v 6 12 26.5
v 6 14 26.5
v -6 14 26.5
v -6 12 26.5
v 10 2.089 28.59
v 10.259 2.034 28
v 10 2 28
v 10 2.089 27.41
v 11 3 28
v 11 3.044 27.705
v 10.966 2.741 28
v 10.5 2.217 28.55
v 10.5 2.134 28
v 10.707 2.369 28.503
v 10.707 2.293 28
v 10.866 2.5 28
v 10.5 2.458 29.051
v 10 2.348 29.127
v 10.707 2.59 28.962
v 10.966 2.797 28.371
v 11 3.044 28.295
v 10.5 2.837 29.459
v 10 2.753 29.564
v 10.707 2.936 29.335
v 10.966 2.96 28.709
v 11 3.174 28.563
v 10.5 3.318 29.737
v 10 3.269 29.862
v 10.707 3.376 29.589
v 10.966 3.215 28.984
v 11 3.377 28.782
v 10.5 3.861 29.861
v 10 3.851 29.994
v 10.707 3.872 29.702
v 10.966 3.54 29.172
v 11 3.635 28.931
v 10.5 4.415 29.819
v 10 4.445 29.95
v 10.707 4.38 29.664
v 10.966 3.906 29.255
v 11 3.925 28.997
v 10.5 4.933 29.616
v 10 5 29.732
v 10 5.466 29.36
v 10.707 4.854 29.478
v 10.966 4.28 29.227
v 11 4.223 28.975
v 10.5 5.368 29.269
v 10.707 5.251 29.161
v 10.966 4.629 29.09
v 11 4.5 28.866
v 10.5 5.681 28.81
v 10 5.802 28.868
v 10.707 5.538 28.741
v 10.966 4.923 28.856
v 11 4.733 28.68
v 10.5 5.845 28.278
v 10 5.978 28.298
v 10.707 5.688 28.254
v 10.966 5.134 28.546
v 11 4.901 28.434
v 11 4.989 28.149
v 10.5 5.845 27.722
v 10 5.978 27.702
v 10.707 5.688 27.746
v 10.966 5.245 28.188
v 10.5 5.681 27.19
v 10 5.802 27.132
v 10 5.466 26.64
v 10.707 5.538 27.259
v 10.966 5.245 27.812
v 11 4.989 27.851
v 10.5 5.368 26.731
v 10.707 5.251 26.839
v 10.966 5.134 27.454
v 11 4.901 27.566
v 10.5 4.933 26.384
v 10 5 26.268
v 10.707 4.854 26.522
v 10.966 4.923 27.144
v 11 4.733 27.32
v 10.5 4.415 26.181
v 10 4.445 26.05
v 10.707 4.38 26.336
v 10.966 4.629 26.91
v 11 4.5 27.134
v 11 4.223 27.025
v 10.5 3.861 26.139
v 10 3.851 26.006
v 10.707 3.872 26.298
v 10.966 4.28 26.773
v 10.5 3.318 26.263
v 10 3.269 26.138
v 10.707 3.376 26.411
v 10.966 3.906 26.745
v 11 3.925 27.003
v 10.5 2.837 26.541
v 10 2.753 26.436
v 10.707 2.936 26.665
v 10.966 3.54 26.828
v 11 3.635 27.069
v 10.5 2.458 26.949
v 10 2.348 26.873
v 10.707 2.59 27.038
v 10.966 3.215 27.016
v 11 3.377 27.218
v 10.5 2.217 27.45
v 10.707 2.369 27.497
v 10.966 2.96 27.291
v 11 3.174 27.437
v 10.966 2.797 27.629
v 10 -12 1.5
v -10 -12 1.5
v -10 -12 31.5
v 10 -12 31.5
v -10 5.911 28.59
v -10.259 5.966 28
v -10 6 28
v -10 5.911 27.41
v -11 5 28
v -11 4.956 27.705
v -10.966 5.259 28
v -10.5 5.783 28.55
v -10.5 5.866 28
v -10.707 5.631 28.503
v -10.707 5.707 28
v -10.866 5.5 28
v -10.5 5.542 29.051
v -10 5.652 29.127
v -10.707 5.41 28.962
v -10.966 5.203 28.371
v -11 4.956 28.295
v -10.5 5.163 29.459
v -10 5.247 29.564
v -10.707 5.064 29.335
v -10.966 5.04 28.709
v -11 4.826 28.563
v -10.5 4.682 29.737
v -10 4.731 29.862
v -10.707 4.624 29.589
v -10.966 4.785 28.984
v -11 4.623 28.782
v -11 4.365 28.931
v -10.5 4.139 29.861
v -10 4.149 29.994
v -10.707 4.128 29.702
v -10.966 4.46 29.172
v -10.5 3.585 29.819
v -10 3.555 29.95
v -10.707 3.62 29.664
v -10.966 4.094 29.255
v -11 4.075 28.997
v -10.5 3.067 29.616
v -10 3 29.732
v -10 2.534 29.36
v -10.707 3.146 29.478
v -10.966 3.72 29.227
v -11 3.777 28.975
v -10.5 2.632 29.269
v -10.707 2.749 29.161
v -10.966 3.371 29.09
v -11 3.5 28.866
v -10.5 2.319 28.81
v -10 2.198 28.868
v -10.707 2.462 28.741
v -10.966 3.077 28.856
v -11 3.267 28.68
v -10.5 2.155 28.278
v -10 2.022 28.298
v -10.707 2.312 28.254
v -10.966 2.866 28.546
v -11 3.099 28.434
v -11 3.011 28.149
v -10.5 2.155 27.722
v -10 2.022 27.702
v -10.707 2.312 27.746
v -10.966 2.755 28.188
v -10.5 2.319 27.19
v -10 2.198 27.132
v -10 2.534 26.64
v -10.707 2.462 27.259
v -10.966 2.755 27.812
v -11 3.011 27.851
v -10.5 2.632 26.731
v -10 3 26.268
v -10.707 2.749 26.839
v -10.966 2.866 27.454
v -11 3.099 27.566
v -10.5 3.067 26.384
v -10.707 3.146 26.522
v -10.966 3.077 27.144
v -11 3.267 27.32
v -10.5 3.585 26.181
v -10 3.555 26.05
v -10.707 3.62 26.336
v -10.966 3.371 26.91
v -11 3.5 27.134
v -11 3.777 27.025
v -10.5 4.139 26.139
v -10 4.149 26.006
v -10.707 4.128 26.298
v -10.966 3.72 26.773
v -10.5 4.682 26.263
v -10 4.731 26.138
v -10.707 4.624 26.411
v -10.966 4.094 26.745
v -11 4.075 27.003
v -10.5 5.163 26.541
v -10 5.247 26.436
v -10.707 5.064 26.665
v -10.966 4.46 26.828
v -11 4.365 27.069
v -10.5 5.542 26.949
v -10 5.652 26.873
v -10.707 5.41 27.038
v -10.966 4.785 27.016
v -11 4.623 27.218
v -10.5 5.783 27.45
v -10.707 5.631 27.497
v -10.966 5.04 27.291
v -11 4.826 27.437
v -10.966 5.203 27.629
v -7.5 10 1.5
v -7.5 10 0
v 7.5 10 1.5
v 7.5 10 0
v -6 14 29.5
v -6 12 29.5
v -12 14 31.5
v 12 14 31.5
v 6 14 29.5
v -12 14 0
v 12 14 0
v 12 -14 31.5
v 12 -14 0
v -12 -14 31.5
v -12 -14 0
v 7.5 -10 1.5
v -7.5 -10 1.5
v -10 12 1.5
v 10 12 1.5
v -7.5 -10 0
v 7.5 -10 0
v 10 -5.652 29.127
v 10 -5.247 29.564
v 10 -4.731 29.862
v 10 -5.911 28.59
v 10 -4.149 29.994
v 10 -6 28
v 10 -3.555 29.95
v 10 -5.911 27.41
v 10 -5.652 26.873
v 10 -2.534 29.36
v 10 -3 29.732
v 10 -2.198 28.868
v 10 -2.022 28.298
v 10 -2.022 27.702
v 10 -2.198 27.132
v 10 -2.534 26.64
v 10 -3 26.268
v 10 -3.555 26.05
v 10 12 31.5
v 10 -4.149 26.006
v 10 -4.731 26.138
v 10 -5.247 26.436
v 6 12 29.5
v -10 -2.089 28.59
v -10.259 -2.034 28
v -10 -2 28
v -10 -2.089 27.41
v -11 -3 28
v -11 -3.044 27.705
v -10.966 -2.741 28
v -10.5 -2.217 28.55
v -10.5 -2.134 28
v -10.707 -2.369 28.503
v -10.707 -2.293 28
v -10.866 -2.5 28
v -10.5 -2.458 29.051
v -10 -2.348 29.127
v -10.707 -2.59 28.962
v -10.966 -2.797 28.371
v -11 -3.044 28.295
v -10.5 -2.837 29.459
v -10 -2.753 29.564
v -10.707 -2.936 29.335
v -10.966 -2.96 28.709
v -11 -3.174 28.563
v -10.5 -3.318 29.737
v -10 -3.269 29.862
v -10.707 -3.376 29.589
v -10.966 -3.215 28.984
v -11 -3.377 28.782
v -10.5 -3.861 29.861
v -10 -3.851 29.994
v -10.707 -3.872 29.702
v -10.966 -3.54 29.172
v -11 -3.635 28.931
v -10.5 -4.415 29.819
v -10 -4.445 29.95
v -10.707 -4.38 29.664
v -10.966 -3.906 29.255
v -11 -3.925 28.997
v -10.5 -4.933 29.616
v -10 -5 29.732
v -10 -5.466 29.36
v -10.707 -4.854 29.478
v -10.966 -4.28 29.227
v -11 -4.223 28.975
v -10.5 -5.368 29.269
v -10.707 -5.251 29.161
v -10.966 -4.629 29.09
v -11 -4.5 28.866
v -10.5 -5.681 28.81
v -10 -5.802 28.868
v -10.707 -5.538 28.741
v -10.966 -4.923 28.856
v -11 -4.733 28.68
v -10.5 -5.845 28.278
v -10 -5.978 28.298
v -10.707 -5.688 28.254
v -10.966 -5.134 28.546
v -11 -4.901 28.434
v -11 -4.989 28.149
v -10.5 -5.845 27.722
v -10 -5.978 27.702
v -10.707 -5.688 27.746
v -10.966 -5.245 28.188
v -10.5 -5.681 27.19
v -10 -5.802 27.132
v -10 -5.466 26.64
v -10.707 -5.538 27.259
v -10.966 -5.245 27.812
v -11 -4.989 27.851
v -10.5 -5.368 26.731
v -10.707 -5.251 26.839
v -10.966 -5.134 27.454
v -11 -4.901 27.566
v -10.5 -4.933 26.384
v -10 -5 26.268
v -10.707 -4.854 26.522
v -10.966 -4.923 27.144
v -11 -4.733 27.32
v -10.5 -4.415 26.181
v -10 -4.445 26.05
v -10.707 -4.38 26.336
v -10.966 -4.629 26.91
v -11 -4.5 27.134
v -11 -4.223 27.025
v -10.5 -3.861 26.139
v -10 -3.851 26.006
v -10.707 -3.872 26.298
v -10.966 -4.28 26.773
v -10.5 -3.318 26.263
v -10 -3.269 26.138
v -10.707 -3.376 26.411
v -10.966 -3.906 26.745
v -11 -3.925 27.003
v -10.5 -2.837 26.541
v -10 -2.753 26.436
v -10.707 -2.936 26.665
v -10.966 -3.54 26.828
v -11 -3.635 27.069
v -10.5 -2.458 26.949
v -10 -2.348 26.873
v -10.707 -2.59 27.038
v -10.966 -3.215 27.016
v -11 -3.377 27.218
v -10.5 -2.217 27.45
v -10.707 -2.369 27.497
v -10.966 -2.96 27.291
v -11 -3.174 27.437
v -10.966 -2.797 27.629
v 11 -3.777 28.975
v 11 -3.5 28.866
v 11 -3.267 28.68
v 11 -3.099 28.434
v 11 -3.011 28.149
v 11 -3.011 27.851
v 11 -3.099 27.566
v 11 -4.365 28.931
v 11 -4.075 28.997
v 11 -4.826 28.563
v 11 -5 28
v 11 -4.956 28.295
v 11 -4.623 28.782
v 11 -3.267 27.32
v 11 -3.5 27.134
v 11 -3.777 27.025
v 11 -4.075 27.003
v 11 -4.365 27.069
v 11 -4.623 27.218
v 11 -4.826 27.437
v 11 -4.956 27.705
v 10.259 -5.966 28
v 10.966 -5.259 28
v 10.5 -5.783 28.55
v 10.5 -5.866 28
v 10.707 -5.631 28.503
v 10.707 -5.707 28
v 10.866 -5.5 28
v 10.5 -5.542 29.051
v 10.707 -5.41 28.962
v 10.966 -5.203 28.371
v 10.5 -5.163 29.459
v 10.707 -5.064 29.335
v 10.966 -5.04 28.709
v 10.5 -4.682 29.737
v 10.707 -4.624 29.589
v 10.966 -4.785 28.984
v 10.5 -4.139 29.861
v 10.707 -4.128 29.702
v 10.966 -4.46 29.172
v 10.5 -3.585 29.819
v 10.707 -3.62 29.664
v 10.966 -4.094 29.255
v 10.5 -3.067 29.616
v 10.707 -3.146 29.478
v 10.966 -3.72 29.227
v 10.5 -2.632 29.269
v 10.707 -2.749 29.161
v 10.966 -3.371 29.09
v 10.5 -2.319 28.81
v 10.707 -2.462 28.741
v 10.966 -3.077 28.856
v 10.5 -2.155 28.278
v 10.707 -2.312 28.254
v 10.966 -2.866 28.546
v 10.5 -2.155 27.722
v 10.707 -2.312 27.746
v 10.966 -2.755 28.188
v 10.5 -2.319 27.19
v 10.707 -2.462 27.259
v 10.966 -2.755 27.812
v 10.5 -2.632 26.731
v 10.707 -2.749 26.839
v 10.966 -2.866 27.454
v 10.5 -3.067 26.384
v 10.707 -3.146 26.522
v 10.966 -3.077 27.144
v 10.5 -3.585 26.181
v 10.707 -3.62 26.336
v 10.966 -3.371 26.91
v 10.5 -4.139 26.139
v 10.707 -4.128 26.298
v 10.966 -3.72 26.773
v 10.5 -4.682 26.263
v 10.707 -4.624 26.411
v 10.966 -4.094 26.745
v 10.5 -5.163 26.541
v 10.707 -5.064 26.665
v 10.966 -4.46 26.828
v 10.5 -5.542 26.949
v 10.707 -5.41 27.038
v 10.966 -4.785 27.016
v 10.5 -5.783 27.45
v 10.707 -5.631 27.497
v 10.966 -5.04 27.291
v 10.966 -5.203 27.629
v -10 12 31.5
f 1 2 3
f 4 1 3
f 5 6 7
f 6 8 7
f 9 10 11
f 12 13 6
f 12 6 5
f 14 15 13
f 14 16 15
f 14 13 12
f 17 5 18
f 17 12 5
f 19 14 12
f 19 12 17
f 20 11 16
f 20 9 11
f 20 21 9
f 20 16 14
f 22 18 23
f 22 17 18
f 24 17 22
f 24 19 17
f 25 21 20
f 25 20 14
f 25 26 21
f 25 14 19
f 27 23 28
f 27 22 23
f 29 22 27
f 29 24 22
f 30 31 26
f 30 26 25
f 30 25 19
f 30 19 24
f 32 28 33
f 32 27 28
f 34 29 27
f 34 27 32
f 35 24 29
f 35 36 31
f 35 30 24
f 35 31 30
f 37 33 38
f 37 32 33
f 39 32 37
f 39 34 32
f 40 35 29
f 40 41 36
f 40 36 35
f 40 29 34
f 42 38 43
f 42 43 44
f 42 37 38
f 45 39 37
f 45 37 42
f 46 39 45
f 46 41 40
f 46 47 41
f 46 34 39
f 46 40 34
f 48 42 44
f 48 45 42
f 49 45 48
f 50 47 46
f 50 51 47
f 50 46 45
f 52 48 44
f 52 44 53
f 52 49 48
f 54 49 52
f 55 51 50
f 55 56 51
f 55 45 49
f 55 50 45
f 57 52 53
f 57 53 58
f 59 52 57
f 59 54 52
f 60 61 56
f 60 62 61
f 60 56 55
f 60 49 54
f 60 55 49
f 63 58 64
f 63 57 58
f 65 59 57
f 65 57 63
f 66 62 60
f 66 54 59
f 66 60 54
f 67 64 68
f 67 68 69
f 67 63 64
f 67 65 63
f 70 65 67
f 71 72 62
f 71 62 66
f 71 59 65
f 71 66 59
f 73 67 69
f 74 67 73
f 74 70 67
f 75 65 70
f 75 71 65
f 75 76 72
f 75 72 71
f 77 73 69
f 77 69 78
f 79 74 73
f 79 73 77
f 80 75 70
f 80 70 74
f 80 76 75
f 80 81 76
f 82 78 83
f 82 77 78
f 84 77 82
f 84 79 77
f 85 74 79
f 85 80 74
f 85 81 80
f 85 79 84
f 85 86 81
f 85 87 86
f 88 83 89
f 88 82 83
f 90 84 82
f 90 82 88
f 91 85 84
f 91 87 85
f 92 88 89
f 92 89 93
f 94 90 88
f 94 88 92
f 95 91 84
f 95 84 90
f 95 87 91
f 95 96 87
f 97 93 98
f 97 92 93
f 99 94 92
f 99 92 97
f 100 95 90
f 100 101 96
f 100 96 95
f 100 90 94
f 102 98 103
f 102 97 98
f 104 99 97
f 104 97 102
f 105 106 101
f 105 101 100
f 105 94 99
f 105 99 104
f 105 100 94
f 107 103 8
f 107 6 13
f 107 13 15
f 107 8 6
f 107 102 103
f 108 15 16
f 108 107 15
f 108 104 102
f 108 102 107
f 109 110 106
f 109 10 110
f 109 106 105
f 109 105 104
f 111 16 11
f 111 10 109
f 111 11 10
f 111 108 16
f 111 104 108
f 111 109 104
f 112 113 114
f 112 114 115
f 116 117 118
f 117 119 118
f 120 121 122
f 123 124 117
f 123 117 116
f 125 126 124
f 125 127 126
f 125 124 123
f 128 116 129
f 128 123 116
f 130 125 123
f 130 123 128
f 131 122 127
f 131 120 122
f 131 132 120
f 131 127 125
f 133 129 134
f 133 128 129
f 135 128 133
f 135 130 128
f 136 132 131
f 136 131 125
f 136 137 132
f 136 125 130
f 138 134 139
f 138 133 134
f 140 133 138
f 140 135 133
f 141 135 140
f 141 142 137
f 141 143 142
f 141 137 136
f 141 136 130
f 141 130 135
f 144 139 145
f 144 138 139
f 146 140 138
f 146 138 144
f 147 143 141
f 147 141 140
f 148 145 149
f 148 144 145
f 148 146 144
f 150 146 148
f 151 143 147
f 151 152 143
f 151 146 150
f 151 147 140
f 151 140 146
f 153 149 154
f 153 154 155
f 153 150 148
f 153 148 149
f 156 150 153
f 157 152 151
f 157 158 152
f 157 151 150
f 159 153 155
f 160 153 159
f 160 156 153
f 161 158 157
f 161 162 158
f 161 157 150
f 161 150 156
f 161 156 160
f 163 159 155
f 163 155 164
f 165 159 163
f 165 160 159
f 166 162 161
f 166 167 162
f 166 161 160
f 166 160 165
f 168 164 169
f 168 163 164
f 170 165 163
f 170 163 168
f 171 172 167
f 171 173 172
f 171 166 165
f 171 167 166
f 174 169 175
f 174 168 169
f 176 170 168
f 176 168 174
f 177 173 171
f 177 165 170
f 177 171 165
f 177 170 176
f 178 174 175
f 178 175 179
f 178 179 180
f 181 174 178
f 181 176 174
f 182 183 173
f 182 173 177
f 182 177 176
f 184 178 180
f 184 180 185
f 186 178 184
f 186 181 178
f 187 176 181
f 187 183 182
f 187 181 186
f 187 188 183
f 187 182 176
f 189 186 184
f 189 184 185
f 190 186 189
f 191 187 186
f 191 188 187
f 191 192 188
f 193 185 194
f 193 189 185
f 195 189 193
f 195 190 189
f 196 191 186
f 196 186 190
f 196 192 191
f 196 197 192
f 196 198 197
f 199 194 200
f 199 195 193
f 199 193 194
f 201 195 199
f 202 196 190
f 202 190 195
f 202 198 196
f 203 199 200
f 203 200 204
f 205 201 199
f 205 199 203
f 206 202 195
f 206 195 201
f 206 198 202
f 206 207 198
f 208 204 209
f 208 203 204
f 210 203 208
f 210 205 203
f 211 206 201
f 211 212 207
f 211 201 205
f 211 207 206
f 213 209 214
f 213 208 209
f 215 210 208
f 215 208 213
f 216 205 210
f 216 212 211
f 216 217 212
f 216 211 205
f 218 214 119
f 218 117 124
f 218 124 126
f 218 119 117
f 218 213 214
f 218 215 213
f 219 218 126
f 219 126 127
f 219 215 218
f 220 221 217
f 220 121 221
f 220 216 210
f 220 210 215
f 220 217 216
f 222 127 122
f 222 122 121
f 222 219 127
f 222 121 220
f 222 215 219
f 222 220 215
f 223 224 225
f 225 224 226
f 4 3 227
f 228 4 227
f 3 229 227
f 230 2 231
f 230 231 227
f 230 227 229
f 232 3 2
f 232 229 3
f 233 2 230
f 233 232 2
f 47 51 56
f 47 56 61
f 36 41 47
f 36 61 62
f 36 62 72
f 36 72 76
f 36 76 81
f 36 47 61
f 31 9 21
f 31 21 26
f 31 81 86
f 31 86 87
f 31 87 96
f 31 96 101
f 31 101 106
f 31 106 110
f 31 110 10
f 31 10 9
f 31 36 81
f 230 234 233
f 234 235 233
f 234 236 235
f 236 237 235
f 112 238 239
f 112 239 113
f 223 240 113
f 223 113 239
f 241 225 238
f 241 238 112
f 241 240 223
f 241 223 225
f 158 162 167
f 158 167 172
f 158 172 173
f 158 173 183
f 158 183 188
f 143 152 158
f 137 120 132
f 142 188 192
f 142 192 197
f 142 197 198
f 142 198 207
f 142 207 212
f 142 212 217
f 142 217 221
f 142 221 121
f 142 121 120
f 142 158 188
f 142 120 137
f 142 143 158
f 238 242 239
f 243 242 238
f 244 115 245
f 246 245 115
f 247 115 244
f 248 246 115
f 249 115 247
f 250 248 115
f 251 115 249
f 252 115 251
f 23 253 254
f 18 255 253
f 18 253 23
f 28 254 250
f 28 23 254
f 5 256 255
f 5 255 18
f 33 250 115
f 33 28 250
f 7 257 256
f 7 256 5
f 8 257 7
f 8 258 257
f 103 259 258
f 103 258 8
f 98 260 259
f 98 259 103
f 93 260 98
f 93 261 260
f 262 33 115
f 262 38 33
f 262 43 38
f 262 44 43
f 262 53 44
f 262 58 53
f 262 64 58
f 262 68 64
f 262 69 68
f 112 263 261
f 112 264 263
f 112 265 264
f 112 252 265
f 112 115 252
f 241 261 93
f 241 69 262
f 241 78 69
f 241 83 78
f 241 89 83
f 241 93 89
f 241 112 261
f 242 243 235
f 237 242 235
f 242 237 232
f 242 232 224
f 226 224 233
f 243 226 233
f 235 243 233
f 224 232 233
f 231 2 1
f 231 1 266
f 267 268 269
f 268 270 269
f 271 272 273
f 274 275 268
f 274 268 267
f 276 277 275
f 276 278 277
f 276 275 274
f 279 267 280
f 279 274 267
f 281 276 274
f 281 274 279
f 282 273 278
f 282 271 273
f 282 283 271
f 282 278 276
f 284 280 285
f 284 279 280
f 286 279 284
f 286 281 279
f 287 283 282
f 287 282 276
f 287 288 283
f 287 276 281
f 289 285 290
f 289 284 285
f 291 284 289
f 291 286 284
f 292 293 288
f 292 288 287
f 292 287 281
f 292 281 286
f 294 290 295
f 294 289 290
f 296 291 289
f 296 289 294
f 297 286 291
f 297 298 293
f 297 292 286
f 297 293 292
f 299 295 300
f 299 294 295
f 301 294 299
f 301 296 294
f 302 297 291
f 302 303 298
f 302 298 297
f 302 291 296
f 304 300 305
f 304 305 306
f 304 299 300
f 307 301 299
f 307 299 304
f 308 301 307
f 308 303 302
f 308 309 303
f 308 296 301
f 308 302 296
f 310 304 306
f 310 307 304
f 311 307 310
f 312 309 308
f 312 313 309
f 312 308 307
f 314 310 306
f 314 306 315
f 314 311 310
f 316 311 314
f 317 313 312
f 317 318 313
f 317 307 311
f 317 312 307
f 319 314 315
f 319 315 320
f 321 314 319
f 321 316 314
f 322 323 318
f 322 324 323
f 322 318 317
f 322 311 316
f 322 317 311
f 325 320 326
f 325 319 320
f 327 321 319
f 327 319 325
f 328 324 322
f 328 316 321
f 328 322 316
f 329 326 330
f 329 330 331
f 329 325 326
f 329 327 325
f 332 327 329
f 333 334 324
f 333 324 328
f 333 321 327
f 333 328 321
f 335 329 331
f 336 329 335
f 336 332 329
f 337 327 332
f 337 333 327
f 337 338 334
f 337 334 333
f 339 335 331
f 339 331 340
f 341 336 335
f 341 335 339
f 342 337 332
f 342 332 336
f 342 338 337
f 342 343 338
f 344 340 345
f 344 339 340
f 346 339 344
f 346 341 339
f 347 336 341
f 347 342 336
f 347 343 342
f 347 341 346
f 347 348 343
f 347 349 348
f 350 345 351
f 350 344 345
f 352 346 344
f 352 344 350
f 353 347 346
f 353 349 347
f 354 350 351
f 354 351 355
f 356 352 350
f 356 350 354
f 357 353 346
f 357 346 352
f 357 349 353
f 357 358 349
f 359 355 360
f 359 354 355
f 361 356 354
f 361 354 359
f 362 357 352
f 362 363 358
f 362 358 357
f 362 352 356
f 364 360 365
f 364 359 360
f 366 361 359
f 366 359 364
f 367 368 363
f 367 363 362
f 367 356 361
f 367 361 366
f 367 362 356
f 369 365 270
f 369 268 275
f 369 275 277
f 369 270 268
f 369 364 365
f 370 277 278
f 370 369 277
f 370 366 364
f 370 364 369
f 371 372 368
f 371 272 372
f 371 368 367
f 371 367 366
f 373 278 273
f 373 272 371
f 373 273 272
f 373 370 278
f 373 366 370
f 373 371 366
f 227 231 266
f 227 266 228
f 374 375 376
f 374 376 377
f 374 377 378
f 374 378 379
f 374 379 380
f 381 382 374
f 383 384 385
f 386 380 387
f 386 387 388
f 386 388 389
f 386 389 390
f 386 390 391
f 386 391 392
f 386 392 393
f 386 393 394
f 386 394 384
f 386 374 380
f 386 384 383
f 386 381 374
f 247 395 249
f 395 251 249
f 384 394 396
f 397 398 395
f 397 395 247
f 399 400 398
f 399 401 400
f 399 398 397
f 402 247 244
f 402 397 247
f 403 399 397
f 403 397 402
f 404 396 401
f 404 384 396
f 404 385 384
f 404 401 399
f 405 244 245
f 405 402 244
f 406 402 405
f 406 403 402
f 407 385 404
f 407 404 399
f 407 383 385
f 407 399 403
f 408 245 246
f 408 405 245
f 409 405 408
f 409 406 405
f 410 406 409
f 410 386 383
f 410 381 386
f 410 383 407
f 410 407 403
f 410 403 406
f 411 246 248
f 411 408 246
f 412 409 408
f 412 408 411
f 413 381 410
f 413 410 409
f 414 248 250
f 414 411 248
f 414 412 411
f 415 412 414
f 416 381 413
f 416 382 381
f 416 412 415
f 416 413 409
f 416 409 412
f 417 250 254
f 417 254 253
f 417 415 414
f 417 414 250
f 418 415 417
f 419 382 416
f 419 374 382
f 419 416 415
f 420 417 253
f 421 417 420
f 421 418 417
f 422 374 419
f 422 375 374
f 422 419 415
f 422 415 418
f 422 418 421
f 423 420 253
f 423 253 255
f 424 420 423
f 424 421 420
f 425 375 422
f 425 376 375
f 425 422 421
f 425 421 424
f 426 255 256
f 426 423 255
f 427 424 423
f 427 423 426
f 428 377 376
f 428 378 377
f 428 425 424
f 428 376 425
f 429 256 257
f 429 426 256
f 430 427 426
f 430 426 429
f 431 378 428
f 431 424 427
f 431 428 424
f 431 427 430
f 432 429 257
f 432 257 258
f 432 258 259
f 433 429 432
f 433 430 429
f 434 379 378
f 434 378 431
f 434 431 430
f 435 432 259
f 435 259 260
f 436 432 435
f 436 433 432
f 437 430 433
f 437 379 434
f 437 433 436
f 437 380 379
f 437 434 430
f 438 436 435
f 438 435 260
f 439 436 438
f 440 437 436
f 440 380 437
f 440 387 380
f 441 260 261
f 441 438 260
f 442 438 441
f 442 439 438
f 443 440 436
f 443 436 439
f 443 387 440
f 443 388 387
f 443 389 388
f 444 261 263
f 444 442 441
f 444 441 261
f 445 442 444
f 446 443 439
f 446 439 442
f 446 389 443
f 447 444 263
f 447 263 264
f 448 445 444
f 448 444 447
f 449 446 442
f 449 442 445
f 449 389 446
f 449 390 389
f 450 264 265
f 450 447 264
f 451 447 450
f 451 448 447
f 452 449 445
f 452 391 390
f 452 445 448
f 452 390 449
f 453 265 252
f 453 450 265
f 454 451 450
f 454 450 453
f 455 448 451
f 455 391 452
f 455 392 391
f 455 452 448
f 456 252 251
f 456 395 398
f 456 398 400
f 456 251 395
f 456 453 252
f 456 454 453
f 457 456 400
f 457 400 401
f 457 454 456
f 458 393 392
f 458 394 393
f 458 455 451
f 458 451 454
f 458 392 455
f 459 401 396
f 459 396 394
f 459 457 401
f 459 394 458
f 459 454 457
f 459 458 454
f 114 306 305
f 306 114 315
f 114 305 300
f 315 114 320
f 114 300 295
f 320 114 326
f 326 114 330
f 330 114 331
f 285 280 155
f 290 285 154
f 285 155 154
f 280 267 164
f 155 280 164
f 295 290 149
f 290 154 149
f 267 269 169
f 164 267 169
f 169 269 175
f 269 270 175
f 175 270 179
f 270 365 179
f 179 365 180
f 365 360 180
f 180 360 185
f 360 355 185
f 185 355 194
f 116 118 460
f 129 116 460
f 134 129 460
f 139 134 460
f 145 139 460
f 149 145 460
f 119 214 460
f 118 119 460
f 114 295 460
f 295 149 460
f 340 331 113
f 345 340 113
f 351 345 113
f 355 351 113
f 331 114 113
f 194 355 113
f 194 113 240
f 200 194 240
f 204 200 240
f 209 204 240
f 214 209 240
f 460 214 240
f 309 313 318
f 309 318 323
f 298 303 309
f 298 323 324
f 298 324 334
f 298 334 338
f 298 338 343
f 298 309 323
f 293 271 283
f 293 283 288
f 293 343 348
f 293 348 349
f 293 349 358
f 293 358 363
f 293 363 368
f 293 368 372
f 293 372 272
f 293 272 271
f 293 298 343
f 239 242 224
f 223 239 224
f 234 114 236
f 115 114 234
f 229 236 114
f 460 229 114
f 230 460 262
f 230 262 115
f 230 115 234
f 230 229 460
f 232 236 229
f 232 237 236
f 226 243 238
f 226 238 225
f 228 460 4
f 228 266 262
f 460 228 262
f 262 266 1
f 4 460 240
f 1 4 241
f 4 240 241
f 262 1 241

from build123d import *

# Parameters (mm, degrees)
F0_W      = 24
F0_H      = 28
F0_W_2    = 15
F0_H_2    = 20
F1_DEPTH  = 1.5
F2_W      = 24
F2_H      = 28
F2_W_2    = 20
F2_H_2    = 24
F3_DEPTH  = 30
F4_R      = 2
F5_DEPTH  = 1
F6_R      = 2
F7_DEPTH  = 1
F8_R      = 0.99999
F9_W      = 12
F9_H      = 3
F10_DEPTH = 2


# Not quite as in the source:
# - a fillet or chamfer is up to 0.001 mm smaller than in the source, because OpenCascade refuses the exact size


with BuildPart() as f1:
    # F0 (on Top) → F1 (new body)
    with BuildSketch(Plane.XY):
        Rectangle(F0_W, F0_H)
        Rectangle(F0_W_2, F0_H_2, mode=Mode.SUBTRACT)
    extrude(amount=F1_DEPTH)

    # F2 (on face) → F3 (join)
    with BuildSketch(Plane.XY.offset(1.5)):
        Rectangle(F2_W, F2_H)
        Rectangle(F2_W_2, F2_H_2, mode=Mode.SUBTRACT)
    extrude(amount=F3_DEPTH)

    # F4 (on face) → F5 (cut)
    with BuildSketch(Plane.YZ.offset(-10)):
        with Locations((-4, 28)):
            Circle(F4_R)
        with Locations((4, 28)):
            Circle(F4_R)
    extrude(amount=-F5_DEPTH, mode=Mode.SUBTRACT)

    # F6 (on face) → F7 (cut)
    with BuildSketch(Plane(origin=(10, 0, 0), x_dir=(0, -1, 0), z_dir=(-1, 0, 0))):
        with Locations((4, 28)):
            Circle(F6_R)
        with Locations((-4, 28)):
            Circle(F6_R)
    extrude(amount=-F7_DEPTH, mode=Mode.SUBTRACT)

    # F8 (radius 1 in the source; OpenCascade refuses exactly that, so slightly less here)
    f8_edges = [f1.edges().sort_by_distance(p)[0] for p in [
        (11, -2, 28),
        (11, 6, 28),
        (-11, -6, 28),
        (-11, 2, 28),
    ]]
    fillet(f8_edges, radius=F8_R)

    # F9 (on face) → F10 (cut, through all)
    with BuildSketch(Plane(origin=(0, 14, 0), x_dir=(-1, 0, 0), z_dir=(0, 1, 0))):
        with Locations((0, 28)):
            Rectangle(F9_W, F9_H)
    extrude(amount=-F10_DEPTH, mode=Mode.SUBTRACT)


solid = f1.part
